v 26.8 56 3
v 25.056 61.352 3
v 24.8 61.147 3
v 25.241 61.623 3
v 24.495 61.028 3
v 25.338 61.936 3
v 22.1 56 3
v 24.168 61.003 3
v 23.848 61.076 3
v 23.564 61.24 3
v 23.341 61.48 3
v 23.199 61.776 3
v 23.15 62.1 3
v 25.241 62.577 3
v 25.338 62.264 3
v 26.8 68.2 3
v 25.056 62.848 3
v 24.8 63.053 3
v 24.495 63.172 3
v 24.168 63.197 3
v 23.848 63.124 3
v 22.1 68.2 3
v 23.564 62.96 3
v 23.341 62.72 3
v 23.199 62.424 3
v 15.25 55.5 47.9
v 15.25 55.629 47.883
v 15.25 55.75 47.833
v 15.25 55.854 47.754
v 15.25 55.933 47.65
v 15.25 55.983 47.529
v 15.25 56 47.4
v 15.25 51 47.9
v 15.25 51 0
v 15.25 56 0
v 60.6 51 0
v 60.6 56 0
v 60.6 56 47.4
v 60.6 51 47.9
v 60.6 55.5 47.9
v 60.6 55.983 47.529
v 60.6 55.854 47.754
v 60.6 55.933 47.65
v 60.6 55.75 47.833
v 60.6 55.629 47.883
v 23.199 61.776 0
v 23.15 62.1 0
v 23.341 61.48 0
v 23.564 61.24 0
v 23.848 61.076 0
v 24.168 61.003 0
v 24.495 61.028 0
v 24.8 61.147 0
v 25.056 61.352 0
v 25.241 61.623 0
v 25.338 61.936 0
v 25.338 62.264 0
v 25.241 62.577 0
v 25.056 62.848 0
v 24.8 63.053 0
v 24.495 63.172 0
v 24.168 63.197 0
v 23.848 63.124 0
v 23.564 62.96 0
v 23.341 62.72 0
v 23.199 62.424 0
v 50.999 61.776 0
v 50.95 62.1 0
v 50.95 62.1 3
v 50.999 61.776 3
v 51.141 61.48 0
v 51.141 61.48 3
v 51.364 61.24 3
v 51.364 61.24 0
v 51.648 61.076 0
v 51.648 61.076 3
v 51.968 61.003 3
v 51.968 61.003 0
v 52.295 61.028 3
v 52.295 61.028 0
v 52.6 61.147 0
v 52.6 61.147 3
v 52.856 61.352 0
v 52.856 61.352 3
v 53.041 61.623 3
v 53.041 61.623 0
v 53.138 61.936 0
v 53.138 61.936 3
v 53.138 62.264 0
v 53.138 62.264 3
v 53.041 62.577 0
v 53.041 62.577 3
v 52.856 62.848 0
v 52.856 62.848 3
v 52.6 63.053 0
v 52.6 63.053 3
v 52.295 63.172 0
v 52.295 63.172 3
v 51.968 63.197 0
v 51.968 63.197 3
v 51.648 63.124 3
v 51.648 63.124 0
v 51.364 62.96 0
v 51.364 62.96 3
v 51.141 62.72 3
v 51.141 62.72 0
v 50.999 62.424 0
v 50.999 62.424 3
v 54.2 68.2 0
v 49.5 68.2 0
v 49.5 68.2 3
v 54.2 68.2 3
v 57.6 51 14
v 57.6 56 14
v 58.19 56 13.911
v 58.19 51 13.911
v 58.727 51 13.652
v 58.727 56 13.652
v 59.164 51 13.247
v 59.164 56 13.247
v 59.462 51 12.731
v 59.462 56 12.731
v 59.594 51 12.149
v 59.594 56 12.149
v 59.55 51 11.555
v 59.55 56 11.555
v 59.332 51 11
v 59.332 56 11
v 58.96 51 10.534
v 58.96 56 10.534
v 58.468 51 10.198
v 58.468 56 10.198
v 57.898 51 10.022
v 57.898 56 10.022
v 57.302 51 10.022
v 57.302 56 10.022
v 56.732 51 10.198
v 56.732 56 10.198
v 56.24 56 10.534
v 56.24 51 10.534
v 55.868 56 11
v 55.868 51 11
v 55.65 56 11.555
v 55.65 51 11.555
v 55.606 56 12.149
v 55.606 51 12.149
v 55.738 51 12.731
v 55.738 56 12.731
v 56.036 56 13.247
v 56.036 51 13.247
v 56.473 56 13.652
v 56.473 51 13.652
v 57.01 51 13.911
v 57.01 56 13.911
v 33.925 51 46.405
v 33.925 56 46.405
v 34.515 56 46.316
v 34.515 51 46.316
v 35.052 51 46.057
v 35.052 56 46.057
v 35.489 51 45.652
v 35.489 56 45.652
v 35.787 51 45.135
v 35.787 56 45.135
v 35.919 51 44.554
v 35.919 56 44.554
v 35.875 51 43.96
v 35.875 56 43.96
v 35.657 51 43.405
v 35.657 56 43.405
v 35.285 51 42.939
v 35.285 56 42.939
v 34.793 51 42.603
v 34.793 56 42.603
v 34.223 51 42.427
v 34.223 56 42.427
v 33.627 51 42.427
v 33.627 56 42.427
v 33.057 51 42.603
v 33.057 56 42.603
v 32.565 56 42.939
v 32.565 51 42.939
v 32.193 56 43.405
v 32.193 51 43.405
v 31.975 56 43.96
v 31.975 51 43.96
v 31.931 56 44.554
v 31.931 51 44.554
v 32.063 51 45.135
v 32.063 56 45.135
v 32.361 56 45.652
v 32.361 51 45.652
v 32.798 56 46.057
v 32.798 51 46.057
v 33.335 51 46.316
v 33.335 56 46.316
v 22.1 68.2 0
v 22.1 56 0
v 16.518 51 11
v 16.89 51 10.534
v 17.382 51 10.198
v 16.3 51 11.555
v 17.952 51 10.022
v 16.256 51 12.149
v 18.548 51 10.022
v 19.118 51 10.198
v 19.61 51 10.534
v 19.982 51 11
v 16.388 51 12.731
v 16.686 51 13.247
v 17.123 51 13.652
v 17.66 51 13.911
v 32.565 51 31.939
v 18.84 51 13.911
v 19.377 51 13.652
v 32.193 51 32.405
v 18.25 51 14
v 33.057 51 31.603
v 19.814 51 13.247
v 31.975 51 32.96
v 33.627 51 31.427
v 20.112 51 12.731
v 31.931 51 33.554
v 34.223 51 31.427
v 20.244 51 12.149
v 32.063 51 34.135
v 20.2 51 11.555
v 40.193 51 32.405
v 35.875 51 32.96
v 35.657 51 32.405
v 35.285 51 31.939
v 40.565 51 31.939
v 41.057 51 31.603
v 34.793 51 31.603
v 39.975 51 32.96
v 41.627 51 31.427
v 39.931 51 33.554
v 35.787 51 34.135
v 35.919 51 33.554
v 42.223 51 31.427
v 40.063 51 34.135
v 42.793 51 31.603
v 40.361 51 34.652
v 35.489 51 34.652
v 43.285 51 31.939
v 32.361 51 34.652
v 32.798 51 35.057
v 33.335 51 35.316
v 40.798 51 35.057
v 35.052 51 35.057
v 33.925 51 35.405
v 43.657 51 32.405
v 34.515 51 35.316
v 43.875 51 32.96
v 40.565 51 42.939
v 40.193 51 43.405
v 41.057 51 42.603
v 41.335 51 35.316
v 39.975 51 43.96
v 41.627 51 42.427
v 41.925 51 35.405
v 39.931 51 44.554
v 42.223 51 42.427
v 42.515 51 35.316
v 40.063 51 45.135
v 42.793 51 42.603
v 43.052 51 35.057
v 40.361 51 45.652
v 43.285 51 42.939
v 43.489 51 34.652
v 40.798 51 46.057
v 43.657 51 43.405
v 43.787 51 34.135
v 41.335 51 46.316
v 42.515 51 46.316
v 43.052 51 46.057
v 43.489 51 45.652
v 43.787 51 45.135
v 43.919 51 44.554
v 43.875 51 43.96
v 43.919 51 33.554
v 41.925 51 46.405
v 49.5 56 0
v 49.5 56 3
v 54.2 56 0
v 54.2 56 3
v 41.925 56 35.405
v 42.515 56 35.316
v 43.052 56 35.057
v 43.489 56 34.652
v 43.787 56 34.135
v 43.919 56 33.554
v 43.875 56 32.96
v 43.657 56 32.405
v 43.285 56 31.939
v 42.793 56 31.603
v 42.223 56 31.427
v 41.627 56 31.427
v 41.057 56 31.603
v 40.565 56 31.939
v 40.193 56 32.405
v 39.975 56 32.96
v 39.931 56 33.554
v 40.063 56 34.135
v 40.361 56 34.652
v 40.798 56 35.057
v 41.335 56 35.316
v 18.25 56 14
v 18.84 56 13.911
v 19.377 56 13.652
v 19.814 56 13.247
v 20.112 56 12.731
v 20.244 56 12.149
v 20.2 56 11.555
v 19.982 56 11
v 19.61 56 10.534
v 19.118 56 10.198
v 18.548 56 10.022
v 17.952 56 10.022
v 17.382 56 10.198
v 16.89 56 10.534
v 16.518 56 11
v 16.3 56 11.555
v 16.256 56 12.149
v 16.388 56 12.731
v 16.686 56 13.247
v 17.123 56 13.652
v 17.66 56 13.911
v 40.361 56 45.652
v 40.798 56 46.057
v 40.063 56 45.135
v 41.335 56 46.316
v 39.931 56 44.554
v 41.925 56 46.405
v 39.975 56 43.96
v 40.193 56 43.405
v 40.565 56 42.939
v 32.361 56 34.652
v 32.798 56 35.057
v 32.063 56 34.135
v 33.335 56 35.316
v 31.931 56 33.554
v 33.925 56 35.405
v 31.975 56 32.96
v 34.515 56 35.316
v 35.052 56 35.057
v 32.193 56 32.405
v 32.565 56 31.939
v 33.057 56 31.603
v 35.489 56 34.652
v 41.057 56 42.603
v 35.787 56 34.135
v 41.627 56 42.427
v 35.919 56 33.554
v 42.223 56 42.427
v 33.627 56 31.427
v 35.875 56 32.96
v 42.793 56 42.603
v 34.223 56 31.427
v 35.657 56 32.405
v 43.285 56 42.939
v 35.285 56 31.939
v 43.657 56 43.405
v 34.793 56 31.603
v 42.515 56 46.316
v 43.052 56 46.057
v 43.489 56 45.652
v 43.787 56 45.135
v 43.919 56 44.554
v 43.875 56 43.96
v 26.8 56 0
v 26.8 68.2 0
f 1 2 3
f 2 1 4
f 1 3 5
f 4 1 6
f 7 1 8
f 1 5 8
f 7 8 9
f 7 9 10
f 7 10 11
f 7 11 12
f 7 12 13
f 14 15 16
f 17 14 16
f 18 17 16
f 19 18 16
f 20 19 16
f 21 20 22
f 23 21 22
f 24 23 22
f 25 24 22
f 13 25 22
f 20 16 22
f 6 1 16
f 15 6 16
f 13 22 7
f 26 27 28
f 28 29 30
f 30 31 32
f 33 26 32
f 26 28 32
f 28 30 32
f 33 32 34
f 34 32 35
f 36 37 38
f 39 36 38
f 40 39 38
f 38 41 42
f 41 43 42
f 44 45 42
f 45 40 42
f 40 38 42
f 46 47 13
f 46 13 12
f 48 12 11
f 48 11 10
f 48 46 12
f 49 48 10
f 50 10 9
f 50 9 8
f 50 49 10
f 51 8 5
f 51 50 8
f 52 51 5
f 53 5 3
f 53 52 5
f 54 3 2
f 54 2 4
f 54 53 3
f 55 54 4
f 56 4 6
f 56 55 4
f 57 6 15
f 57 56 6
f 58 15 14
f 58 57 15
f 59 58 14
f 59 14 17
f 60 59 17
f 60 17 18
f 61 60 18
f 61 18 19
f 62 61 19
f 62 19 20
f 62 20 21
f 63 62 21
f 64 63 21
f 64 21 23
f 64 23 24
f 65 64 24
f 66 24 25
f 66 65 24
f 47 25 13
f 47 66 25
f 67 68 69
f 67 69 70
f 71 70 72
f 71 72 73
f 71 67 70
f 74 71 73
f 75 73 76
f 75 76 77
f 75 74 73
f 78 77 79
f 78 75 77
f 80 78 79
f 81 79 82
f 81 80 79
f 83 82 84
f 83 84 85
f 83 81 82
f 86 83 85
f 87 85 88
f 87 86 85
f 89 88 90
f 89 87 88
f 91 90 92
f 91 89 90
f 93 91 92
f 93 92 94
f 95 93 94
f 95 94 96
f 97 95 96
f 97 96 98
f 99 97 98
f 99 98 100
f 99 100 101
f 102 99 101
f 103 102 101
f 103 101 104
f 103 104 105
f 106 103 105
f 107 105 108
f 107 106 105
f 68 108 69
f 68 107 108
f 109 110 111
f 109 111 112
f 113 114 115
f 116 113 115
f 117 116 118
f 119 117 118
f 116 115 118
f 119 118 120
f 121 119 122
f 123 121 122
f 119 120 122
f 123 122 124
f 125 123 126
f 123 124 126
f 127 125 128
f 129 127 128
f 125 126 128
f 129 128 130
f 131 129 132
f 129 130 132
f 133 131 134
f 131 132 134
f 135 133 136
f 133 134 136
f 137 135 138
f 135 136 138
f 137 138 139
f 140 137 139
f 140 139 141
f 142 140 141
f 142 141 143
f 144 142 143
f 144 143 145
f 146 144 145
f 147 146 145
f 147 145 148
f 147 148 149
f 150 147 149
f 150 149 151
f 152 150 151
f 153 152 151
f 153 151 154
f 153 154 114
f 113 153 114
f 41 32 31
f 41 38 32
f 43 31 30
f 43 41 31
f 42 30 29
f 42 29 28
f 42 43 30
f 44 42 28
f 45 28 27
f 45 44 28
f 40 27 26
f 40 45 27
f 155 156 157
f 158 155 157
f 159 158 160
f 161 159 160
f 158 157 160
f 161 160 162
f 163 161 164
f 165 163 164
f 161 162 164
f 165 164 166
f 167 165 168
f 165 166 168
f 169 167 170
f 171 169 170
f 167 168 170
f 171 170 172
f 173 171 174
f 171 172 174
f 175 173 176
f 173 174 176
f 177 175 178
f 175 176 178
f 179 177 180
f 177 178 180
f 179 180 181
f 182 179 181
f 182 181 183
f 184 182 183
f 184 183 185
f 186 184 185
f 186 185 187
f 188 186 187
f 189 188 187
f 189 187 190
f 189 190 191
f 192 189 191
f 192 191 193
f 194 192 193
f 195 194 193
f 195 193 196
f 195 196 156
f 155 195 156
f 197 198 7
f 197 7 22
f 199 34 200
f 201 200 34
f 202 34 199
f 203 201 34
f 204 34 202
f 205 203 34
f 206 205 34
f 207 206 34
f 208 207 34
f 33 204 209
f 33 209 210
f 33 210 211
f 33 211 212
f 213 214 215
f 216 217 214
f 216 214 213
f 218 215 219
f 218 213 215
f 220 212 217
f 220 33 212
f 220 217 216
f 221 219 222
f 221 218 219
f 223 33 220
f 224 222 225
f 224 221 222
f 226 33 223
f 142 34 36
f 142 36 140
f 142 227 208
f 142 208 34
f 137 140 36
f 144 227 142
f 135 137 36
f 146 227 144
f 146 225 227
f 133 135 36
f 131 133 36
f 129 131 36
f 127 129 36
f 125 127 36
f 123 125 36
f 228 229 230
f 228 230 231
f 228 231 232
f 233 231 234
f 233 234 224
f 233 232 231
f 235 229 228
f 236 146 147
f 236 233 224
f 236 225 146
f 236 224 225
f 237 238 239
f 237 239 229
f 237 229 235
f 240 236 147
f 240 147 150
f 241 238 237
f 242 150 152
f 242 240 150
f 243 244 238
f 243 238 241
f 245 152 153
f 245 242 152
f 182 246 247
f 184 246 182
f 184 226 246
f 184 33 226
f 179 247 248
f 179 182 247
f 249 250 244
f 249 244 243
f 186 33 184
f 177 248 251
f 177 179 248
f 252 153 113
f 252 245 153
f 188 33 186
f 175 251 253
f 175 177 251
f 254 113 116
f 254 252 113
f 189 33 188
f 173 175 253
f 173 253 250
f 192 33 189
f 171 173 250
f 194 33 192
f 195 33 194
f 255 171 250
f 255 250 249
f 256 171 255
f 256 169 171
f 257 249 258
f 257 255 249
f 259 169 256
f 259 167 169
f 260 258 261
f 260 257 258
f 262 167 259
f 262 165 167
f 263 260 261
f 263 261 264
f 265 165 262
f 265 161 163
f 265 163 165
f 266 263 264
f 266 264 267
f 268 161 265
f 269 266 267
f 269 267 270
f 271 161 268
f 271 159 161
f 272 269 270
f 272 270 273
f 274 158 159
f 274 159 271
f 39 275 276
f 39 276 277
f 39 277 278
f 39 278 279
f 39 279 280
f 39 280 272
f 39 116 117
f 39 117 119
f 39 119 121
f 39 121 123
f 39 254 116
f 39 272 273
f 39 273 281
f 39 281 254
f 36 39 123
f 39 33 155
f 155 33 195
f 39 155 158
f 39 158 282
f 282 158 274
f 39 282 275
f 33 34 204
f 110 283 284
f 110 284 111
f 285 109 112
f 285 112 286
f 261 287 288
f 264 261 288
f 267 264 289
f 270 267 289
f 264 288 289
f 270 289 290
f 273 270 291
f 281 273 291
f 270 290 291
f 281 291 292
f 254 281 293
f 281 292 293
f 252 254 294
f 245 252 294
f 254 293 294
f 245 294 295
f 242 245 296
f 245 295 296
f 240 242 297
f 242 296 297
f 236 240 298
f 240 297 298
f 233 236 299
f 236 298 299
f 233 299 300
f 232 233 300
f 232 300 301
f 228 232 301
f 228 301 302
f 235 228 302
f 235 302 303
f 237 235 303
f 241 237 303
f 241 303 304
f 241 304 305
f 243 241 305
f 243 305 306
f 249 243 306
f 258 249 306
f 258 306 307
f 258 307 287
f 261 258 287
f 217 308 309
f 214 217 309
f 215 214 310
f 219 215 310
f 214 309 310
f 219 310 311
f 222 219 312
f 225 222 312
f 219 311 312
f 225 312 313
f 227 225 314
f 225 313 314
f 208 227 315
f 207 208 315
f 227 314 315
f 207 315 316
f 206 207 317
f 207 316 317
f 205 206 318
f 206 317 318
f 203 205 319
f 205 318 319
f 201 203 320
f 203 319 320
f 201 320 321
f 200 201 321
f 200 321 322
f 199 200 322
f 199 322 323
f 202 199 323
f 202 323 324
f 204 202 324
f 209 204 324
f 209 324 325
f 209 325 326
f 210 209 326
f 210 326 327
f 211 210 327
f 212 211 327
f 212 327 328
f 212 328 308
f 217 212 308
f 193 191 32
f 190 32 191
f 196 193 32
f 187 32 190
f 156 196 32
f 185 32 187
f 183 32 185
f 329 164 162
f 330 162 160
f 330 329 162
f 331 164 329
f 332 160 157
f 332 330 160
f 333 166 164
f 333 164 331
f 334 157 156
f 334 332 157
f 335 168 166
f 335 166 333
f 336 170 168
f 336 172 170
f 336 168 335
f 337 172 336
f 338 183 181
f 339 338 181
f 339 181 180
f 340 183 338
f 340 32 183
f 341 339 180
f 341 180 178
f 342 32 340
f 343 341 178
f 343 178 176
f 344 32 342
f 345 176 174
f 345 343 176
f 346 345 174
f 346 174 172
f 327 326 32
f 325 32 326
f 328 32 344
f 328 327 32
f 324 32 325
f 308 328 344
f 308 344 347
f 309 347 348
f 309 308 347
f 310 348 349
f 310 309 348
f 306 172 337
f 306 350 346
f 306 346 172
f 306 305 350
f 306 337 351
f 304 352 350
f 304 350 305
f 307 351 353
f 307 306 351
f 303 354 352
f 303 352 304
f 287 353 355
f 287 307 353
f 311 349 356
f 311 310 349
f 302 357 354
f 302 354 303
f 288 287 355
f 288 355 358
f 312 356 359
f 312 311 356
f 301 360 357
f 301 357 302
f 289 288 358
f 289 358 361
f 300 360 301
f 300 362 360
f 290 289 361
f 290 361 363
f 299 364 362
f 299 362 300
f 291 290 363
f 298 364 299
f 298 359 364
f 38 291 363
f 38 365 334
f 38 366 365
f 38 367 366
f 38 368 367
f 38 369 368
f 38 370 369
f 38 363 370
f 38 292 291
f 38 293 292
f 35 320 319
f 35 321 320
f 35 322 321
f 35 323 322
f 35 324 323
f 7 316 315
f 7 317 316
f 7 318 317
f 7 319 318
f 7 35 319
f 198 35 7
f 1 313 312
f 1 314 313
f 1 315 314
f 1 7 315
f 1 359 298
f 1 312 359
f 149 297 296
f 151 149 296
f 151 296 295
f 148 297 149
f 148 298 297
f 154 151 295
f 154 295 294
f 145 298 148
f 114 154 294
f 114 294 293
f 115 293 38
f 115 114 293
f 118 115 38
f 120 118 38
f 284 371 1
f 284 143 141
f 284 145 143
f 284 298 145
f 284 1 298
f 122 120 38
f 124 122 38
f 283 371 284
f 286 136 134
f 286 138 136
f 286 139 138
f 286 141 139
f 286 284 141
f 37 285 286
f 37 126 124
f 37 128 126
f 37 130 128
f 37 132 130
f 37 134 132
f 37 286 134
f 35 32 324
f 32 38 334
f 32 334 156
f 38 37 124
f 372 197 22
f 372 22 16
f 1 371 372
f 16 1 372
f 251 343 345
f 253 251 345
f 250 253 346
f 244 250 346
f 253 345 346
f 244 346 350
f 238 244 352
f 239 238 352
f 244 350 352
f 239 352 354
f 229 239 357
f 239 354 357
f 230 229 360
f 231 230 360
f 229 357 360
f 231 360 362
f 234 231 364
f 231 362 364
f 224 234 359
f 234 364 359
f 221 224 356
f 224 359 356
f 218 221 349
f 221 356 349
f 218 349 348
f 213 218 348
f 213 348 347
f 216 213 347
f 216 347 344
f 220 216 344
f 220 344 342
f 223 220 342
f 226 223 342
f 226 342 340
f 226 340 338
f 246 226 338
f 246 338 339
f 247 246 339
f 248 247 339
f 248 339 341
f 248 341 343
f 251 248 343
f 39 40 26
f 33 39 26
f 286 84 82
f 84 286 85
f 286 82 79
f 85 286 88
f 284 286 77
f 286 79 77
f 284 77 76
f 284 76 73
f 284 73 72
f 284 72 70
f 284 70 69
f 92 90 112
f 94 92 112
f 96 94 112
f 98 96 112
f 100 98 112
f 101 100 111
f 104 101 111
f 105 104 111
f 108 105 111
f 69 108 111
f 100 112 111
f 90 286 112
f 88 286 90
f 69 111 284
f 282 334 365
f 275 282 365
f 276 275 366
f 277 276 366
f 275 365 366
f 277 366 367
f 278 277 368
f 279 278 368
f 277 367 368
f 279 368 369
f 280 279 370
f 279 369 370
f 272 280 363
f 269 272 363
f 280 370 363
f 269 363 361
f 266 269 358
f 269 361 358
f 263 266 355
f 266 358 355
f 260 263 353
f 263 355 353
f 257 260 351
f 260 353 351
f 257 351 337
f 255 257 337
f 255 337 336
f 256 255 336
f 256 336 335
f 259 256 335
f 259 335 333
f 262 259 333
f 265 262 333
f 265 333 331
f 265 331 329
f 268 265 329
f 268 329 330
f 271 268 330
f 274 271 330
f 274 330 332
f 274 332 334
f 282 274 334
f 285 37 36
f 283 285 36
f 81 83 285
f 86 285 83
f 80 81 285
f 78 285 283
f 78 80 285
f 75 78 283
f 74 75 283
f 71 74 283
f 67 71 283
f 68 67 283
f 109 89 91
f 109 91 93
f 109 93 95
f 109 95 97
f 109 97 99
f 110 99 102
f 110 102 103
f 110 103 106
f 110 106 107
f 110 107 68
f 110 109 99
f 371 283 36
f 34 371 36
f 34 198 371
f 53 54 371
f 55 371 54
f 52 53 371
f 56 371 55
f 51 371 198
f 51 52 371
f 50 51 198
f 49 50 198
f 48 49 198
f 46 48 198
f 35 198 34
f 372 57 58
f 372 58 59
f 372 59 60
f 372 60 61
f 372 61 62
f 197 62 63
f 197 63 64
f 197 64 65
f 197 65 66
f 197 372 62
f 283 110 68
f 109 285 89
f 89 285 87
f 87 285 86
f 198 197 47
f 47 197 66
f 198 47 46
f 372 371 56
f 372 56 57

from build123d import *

# Parameters (mm, degrees)
BOSS_EXTRUDE1_DEPTH = 47.9
SKETCH4_W           = 91.495453484
SKETCH4_H           = 57.017695921
CUT_EXTRUDE3_DEPTH  = 20
BOSS_EXTRUDE2_DEPTH = 3
FILLET1_R           = 0.5
SKETCH7_W           = 5
SKETCH7_H           = 47.9
CUT_EXTRUDE4_DEPTH  = 31
SKETCH8_W           = 14.75
SKETCH8_H           = 46.9
SKETCH8_W_2         = 14.5
CUT_EXTRUDE6_DEPTH  = 90.636878571
SKETCH9_W           = 45.35
SKETCH9_H           = 26.396021741
CUT_EXTRUDE7_DEPTH  = 3
BOSS_EXTRUDE3_DEPTH = 3
SKETCH12_W          = 22.7
SKETCH12_H          = 12.2
CUT_EXTRUDE8_DEPTH  = 104.043728582
SKETCH13_W          = 45.35
SKETCH13_H          = 5
BOSS_EXTRUDE4_DEPTH = 3
SKETCH16_R          = 2
CUT_EXTRUDE9_DEPTH  = 10
SKETCH18_R          = 2
CUT_EXTRUDE10_DEPTH = 10


with BuildPart() as part:
    # Sketch1 → Boss-Extrude1 (new body)
    with BuildSketch(Plane.XY):
        Polygon((0, 0), (0, 56), (75.6, 56), (75.6, 0), (70.6, 0), (70.6, 51), (5, 51), (5, 0), align=None)
    extrude(amount=BOSS_EXTRUDE1_DEPTH)

    # Sketch4 → Cut-Extrude3 (cut)
    with BuildSketch(Plane.XZ):
        with Locations((38.801775038, 24.20044376)):
            Rectangle(SKETCH4_W, SKETCH4_H)
    extrude(amount=-CUT_EXTRUDE3_DEPTH, mode=Mode.SUBTRACT)

    # Sketch6 → Boss-Extrude2 (add)
    with BuildSketch(Plane(origin=(0, 56, 0), x_dir=(1, 0, 0), z_dir=(0, 1, 0))):
        Polygon((26.9, -4.3), (26.9, 0), (24.9, 0), (24.9, -2.3), (20.1, -2.3), (20.1, -8.8), (24.9, -8.8), (24.9, -24.5), (51.4, -24.5), (51.4, -8.8), (56.2, -8.8), (56.2, -2.3), (51.4, -2.3), (51.4, 0), (49.4, 0), (49.4, -4.3), (54.2, -4.3), (54.2, -6.8), (49.4, -6.8), (49.4, -22.5), (26.9, -22.5), (26.9, -6.8), (22.1, -6.8), (22.1, -4.3), align=None)
    extrude(amount=BOSS_EXTRUDE2_DEPTH)

    # Fillet1
    fillet1_edges = [part.edges().sort_by_distance(p)[0] for p in [
        (0, 56, 23.95),
        (75.6, 56, 23.95),
        (37.8, 56, 47.9),
        (12.45, 56, 0),
        (24.9, 57.5, 0),
        (51.4, 57.5, 0),
        (24.9, 56, 1.15),
        (51.4, 56, 1.15),
        (53.8, 56, 2.3),
        (56.2, 56, 5.55),
        (53.8, 56, 8.8),
        (51.4, 56, 16.65),
        (38.15, 56, 24.5),
        (24.9, 56, 16.65),
        (22.5, 56, 8.8),
        (20.1, 56, 5.55),
        (22.5, 56, 2.3),
        (63.5, 56, 0),
    ]]
    fillet(fillet1_edges, radius=FILLET1_R)

    # Sketch7 → Cut-Extrude4 (cut)
    with BuildSketch(Plane.XZ.offset(-20)):
        with Locations((2.5, 23.95)):
            Rectangle(SKETCH7_W, SKETCH7_H)
        with Locations((73.1, 23.95)):
            Rectangle(SKETCH7_W, SKETCH7_H)
    extrude(amount=-CUT_EXTRUDE4_DEPTH, mode=Mode.SUBTRACT)

    # Sketch8 → Cut-Extrude6 (cut, through all)
    with BuildSketch(Plane(origin=(0, 56, 0), x_dir=(1, 0, 0), z_dir=(0, 1, 0))):
        with Locations((7.875, -23.95)):
            Rectangle(SKETCH8_W, SKETCH8_H)
        Polygon((0.25, -47.65), (0.25, 0), (0, 0), (0, -47.9), (15.25, -47.9), (15.25, -47.65), align=None)
        Polygon((15.25, -0.5), (15.25, 0), (0.25, 0), (0.25, -47.65), (15.25, -47.65), (15.25, -47.4), (0.5, -47.4), (0.5, -0.5), align=None)
        with Locations((67.85, -23.95)):
            Rectangle(SKETCH8_W_2, SKETCH8_H)
        Polygon((75.1, -47.4), (60.6, -47.4), (60.6, -47.9), (75.6, -47.9), (75.6, 0), (60.6, 0), (60.6, -0.5), (75.1, -0.5), align=None)
    extrude(amount=-CUT_EXTRUDE6_DEPTH, mode=Mode.SUBTRACT)

    # Sketch9 → Cut-Extrude7 (cut)
    with BuildSketch(Plane(origin=(0, 59, 0), x_dir=(1, 0, 0), z_dir=(0, 1, 0))):
        with Locations((37.925, -13.198010871)):
            Rectangle(SKETCH9_W, SKETCH9_H)
    extrude(amount=-CUT_EXTRUDE7_DEPTH, mode=Mode.SUBTRACT)

    # Sketch11 → Boss-Extrude3 (add)
    with BuildSketch(Plane(origin=(0, 0, 0), x_dir=(-1, 0, 0), z_dir=(0, 0, -1))):
        with BuildLine():
            Line((-50.95, 62.1), (-38.15, 62.1))
            Line((-38.15, 62.1), (-38.15, 68.2))
            Line((-38.15, 68.2), (-54.2, 68.2))
            Line((-54.2, 68.2), (-54.2, 62.1))
            Line((-54.2, 62.1), (-53.15, 62.1))
            ThreePointArc((-53.15, 62.1), (-52.05, 63.2), (-50.95, 62.1))
        make_face()
        with BuildLine():
            Line((-51.033974596, 56), (-38.15, 56))
            Line((-38.15, 56), (-38.15, 62.1))
            Line((-38.15, 62.1), (-50.95, 62.1))
            ThreePointArc((-50.95, 62.1), (-52.05, 61), (-53.15, 62.1))
            Line((-53.15, 62.1), (-54.2, 62.1))
            Line((-54.2, 62.1), (-54.2, 56))
            Line((-54.2, 56), (-51.033974596, 56))
        make_face()
        with BuildLine():
            Line((-38.15, 68.2), (-38.15, 62.1))
            Line((-38.15, 62.1), (-25.35, 62.1))
            ThreePointArc((-25.35, 62.1), (-24.25, 63.2), (-23.15, 62.1))
            Line((-23.15, 62.1), (-22.1, 62.1))
            Line((-22.1, 62.1), (-22.1, 68.2))
            Line((-22.1, 68.2), (-38.15, 68.2))
        make_face()
        with BuildLine():
            Line((-38.15, 62.1), (-38.15, 56))
            Line((-38.15, 56), (-25.266025404, 56))
            Line((-25.266025404, 56), (-22.1, 56))
            Line((-22.1, 56), (-22.1, 62.1))
            Line((-22.1, 62.1), (-23.15, 62.1))
            ThreePointArc((-23.15, 62.1), (-24.25, 61), (-25.35, 62.1))
            Line((-25.35, 62.1), (-38.15, 62.1))
        make_face()
    extrude(amount=-BOSS_EXTRUDE3_DEPTH)

    # Sketch12 → Cut-Extrude8 (cut, through all)
    with BuildSketch(Plane(origin=(0, 0, 0), x_dir=(-1, 0, 0), z_dir=(0, 0, -1))):
        with Locations((-38.15, 62.1)):
            Rectangle(SKETCH12_W, SKETCH12_H)
    extrude(amount=-CUT_EXTRUDE8_DEPTH, mode=Mode.SUBTRACT)

    # Sketch13 → Boss-Extrude4 (add)
    with BuildSketch(Plane(origin=(0, 0, 0), x_dir=(-1, 0, 0), z_dir=(0, 0, -1))):
        with Locations((-37.925, 53.5)):
            Rectangle(SKETCH13_W, SKETCH13_H)
    extrude(amount=-BOSS_EXTRUDE4_DEPTH)

    # Sketch16 → Cut-Extrude9 (cut)
    with BuildSketch(Plane(origin=(0, 56, 0), x_dir=(1, 0, 0), z_dir=(0, 1, 0))):
        with Locations(Location((33.925, -33.404714852, 0), (0, 0, 270))):
            Circle(SKETCH16_R)
        with Locations(Location((41.925, -33.404714852, 0), (0, 0, 270))):
            Circle(SKETCH16_R)
        with Locations(Location((41.925, -44.404714852, 0), (0, 0, 270))):
            Circle(SKETCH16_R)
        with Locations(Location((33.925, -44.404714852, 0), (0, 0, 270))):
            Circle(SKETCH16_R)
    extrude(amount=-CUT_EXTRUDE9_DEPTH, mode=Mode.SUBTRACT)

    # Sketch18 → Cut-Extrude10 (cut)
    with BuildSketch(Plane(origin=(0, 56, 0), x_dir=(1, 0, 0), z_dir=(0, 1, 0))):
        with Locations(Location((18.25, -12, 0), (0, 0, 270))):
            Circle(SKETCH18_R)
        with Locations(Location((57.6, -12, 0), (0, 0, 270))):
            Circle(SKETCH18_R)
    extrude(amount=-CUT_EXTRUDE10_DEPTH, mode=Mode.SUBTRACT)


solid = part.part
